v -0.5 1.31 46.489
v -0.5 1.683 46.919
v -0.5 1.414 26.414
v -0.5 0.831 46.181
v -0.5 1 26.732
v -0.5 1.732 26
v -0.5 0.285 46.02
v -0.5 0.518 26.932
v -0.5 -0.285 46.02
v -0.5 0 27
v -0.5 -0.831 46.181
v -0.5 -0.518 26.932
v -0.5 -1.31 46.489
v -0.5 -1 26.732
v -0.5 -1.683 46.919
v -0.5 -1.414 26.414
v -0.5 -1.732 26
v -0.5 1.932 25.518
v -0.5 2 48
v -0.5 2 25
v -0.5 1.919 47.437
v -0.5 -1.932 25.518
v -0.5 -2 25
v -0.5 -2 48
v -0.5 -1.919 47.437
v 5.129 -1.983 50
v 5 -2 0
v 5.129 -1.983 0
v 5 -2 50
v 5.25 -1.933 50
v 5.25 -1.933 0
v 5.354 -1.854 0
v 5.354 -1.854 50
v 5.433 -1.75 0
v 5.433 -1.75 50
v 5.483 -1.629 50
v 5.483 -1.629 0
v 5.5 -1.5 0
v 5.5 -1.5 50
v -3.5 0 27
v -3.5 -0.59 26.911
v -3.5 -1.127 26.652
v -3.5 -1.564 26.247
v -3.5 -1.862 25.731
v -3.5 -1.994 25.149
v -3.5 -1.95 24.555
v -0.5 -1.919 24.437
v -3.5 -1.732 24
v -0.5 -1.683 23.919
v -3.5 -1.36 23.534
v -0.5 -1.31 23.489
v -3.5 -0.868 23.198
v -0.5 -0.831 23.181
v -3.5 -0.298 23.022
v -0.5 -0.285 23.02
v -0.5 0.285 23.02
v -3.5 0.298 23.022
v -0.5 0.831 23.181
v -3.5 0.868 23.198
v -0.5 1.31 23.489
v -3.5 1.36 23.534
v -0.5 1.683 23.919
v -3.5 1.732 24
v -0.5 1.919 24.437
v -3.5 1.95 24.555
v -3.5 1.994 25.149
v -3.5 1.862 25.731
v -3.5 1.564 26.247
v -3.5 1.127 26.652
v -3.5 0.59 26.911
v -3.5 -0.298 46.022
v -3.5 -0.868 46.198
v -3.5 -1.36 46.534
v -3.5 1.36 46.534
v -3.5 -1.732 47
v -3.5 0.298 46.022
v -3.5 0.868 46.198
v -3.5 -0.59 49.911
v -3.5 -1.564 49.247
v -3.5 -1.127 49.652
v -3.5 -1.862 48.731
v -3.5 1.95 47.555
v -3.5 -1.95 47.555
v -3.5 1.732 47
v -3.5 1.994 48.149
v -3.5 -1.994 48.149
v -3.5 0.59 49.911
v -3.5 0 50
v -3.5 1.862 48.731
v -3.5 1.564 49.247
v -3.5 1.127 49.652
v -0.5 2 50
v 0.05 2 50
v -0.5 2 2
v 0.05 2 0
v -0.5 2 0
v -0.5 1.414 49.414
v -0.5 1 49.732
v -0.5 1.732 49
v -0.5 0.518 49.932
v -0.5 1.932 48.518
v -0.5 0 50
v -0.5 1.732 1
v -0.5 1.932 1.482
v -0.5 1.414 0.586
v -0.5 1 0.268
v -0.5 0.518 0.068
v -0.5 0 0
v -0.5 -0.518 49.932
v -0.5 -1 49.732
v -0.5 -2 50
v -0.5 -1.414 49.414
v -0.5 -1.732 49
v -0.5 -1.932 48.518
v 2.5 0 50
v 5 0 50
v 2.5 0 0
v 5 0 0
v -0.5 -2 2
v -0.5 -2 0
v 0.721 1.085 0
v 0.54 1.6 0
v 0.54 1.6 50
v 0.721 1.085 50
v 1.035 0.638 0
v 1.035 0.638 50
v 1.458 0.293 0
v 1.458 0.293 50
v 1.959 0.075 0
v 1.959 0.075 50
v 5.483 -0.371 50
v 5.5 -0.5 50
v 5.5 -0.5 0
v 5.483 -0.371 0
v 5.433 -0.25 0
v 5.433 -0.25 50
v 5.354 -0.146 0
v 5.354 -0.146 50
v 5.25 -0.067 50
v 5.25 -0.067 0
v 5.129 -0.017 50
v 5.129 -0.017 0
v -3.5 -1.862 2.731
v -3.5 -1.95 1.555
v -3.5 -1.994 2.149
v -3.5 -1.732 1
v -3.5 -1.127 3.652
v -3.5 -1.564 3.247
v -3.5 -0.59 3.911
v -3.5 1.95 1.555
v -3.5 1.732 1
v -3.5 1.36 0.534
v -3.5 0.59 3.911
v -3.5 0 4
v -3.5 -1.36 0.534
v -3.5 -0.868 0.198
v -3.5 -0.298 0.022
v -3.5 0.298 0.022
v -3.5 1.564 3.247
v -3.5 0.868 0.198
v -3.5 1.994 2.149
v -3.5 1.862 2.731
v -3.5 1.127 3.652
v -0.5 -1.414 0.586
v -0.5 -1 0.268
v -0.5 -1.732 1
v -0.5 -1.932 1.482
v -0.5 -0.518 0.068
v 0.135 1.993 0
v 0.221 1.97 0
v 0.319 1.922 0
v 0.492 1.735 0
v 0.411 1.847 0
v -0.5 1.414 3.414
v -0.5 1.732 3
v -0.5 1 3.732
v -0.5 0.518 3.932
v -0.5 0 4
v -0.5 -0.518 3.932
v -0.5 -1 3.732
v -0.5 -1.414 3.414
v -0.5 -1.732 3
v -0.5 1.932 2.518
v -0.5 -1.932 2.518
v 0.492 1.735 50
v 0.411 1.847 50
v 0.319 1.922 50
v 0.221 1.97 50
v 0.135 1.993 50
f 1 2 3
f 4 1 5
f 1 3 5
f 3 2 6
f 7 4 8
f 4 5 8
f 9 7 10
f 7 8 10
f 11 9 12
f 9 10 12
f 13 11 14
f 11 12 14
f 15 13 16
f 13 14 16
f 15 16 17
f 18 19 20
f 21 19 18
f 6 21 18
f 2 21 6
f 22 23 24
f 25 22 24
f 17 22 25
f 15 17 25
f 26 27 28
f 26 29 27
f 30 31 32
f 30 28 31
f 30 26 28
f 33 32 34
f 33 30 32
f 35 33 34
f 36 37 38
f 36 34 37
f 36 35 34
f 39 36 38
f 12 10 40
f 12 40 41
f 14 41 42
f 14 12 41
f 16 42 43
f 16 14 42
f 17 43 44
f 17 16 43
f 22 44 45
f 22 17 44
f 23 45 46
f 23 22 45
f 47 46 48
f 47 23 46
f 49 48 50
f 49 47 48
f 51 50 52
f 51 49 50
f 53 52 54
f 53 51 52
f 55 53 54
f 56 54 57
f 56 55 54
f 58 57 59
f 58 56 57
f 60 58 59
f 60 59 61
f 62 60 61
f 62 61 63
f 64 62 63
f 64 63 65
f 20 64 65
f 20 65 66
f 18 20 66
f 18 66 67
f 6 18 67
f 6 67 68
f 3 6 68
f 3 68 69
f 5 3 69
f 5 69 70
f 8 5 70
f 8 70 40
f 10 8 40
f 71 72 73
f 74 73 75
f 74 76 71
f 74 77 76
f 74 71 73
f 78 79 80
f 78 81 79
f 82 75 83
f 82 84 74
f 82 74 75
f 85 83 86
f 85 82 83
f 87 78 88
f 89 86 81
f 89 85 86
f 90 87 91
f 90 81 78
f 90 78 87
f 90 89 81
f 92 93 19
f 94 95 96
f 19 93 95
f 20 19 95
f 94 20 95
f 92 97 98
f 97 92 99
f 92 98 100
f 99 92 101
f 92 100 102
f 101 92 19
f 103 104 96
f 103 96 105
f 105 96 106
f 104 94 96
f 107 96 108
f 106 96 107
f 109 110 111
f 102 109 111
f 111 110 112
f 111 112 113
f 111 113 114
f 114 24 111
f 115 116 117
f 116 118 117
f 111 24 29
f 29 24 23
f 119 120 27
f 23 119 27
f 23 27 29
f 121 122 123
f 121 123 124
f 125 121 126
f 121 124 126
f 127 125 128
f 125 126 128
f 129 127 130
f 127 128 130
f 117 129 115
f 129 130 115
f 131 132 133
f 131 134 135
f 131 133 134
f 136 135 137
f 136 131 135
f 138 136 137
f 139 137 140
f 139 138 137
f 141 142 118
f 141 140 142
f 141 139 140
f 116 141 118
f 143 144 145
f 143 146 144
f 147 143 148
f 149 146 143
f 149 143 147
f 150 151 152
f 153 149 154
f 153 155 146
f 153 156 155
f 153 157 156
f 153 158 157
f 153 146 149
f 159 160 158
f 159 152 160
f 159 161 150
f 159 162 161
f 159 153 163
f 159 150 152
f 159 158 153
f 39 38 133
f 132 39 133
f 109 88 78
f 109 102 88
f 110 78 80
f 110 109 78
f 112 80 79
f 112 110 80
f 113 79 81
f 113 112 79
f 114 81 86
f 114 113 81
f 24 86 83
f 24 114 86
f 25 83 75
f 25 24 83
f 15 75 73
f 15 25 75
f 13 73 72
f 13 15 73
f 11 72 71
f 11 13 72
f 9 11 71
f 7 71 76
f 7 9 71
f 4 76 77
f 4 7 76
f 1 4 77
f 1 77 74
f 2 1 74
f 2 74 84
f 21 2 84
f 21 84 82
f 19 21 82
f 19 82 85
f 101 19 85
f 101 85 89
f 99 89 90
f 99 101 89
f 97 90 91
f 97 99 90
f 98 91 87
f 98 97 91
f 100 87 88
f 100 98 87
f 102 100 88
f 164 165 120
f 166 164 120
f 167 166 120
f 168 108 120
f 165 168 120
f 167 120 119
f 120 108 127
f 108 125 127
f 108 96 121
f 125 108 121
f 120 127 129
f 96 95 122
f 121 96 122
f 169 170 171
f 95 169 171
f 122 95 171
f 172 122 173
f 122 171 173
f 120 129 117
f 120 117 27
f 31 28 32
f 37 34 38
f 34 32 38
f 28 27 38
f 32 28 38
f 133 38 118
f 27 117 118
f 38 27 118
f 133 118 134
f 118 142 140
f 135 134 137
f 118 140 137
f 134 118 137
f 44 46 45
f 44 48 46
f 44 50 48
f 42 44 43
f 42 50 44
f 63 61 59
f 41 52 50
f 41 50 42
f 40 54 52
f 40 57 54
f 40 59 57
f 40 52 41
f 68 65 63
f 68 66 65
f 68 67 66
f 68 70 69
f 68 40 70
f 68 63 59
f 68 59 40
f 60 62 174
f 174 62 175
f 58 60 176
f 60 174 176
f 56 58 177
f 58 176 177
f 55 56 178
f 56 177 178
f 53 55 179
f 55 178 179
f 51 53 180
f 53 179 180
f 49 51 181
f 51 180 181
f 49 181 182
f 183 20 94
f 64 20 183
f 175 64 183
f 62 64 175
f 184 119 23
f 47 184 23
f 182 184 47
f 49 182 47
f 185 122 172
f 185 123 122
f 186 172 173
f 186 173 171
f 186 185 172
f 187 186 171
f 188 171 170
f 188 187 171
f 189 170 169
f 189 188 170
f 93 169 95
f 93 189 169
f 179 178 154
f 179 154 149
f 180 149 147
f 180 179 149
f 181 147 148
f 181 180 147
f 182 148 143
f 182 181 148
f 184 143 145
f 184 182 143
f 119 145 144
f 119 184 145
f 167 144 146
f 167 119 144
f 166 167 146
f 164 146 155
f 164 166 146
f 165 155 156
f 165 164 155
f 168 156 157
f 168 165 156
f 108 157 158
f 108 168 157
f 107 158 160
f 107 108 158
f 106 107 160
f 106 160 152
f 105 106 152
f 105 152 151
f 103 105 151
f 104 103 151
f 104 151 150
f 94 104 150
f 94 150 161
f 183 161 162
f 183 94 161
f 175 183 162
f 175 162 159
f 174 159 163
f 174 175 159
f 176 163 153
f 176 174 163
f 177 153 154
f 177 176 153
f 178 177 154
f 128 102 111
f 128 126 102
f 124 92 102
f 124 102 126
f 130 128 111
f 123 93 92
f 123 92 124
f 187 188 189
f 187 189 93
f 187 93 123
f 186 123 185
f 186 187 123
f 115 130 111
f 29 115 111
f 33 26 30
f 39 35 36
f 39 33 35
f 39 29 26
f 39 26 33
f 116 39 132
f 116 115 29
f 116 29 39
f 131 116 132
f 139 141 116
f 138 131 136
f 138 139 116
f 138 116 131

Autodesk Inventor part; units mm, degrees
ref_plane "YZ Plane" through (0, 0, 0) normal (1, 0, 0) x (0, 1, 0)
ref_plane "XZ Plane" through (0, 0, 0) normal (0, 1, 0) x (-1, 0, 0)
ref_plane "XY Plane" through (0, 0, 0) normal (0, 0, 1) x (1, 0, 0)
sketch "Sketch1" plane through (0, 0, 0) normal (0, 0, 1) x (1, 0, 0)
  line L0 (-0.5, -2) -> (0.5, -2)
  line L1 (0.5, 0) -> (0.5, 2)
  line L2 (0.5, 2) -> (-0.5, 2)
  line L3 (-0.5, 2) -> (-0.5, -2)
  line L4 (-0.5, -2) -> (0.5, 2) construction
  line L5 (0.5, -2) -> (-0.5, 2) construction
  line L6 (0.5, -2) -> (5.5, -2)
  line L7 (5.5, -2) -> (5.5, 0)
  line L8 (5.5, 0) -> (0.5, 0)
  point P0 (0, 0)
  dimension "d0" = 1
  dimension "d1" = 4
  dimension "d2" = 5
  dimension "d3" = 14.036
  dimension "d4" = 2
extrude "Extrusion1" add sketch "Sketch1" along normal blind 50
fillet "Fillet1" radius 2 1 edges at (0.5, 0, 25)
fillet "Fillet2" radius 0.5 4 edges at (0.5, 1.9995, 25) (0.5, 2, 25) (5.5, -2, 25) (5.5, 0, 25)
sketch "Sketch2" plane through (-0.5, -2, 0) normal (-1, 0, 0) x (0, 0, 1)
  line L0 (50, 2) -> (0, 2) projected
  circle A0 centre (2, 2) radius 2
  line L1 (0, 4) -> (50, 4) projected
  line L2 (50, 4) -> (50, 0) projected
  circle A1 centre (48, 2) radius 2
  circle A2 centre (25, 2) radius 2
  dimension "d9" = 2
  dimension "d11" = 4
  dimension "d12" = 2
  dimension "d13" = 0
  dimension "d14" = 4
  dimension "d15" = 0
  dimension "d16" = 23
extrude "Extrusion2" add sketch "Sketch2" along normal blind 3 contours A0 L0 | L0 A0 | A2 L0 | L0 A2 | A1 L0 | L0 A1
properties part number "19 bakjes legger"
